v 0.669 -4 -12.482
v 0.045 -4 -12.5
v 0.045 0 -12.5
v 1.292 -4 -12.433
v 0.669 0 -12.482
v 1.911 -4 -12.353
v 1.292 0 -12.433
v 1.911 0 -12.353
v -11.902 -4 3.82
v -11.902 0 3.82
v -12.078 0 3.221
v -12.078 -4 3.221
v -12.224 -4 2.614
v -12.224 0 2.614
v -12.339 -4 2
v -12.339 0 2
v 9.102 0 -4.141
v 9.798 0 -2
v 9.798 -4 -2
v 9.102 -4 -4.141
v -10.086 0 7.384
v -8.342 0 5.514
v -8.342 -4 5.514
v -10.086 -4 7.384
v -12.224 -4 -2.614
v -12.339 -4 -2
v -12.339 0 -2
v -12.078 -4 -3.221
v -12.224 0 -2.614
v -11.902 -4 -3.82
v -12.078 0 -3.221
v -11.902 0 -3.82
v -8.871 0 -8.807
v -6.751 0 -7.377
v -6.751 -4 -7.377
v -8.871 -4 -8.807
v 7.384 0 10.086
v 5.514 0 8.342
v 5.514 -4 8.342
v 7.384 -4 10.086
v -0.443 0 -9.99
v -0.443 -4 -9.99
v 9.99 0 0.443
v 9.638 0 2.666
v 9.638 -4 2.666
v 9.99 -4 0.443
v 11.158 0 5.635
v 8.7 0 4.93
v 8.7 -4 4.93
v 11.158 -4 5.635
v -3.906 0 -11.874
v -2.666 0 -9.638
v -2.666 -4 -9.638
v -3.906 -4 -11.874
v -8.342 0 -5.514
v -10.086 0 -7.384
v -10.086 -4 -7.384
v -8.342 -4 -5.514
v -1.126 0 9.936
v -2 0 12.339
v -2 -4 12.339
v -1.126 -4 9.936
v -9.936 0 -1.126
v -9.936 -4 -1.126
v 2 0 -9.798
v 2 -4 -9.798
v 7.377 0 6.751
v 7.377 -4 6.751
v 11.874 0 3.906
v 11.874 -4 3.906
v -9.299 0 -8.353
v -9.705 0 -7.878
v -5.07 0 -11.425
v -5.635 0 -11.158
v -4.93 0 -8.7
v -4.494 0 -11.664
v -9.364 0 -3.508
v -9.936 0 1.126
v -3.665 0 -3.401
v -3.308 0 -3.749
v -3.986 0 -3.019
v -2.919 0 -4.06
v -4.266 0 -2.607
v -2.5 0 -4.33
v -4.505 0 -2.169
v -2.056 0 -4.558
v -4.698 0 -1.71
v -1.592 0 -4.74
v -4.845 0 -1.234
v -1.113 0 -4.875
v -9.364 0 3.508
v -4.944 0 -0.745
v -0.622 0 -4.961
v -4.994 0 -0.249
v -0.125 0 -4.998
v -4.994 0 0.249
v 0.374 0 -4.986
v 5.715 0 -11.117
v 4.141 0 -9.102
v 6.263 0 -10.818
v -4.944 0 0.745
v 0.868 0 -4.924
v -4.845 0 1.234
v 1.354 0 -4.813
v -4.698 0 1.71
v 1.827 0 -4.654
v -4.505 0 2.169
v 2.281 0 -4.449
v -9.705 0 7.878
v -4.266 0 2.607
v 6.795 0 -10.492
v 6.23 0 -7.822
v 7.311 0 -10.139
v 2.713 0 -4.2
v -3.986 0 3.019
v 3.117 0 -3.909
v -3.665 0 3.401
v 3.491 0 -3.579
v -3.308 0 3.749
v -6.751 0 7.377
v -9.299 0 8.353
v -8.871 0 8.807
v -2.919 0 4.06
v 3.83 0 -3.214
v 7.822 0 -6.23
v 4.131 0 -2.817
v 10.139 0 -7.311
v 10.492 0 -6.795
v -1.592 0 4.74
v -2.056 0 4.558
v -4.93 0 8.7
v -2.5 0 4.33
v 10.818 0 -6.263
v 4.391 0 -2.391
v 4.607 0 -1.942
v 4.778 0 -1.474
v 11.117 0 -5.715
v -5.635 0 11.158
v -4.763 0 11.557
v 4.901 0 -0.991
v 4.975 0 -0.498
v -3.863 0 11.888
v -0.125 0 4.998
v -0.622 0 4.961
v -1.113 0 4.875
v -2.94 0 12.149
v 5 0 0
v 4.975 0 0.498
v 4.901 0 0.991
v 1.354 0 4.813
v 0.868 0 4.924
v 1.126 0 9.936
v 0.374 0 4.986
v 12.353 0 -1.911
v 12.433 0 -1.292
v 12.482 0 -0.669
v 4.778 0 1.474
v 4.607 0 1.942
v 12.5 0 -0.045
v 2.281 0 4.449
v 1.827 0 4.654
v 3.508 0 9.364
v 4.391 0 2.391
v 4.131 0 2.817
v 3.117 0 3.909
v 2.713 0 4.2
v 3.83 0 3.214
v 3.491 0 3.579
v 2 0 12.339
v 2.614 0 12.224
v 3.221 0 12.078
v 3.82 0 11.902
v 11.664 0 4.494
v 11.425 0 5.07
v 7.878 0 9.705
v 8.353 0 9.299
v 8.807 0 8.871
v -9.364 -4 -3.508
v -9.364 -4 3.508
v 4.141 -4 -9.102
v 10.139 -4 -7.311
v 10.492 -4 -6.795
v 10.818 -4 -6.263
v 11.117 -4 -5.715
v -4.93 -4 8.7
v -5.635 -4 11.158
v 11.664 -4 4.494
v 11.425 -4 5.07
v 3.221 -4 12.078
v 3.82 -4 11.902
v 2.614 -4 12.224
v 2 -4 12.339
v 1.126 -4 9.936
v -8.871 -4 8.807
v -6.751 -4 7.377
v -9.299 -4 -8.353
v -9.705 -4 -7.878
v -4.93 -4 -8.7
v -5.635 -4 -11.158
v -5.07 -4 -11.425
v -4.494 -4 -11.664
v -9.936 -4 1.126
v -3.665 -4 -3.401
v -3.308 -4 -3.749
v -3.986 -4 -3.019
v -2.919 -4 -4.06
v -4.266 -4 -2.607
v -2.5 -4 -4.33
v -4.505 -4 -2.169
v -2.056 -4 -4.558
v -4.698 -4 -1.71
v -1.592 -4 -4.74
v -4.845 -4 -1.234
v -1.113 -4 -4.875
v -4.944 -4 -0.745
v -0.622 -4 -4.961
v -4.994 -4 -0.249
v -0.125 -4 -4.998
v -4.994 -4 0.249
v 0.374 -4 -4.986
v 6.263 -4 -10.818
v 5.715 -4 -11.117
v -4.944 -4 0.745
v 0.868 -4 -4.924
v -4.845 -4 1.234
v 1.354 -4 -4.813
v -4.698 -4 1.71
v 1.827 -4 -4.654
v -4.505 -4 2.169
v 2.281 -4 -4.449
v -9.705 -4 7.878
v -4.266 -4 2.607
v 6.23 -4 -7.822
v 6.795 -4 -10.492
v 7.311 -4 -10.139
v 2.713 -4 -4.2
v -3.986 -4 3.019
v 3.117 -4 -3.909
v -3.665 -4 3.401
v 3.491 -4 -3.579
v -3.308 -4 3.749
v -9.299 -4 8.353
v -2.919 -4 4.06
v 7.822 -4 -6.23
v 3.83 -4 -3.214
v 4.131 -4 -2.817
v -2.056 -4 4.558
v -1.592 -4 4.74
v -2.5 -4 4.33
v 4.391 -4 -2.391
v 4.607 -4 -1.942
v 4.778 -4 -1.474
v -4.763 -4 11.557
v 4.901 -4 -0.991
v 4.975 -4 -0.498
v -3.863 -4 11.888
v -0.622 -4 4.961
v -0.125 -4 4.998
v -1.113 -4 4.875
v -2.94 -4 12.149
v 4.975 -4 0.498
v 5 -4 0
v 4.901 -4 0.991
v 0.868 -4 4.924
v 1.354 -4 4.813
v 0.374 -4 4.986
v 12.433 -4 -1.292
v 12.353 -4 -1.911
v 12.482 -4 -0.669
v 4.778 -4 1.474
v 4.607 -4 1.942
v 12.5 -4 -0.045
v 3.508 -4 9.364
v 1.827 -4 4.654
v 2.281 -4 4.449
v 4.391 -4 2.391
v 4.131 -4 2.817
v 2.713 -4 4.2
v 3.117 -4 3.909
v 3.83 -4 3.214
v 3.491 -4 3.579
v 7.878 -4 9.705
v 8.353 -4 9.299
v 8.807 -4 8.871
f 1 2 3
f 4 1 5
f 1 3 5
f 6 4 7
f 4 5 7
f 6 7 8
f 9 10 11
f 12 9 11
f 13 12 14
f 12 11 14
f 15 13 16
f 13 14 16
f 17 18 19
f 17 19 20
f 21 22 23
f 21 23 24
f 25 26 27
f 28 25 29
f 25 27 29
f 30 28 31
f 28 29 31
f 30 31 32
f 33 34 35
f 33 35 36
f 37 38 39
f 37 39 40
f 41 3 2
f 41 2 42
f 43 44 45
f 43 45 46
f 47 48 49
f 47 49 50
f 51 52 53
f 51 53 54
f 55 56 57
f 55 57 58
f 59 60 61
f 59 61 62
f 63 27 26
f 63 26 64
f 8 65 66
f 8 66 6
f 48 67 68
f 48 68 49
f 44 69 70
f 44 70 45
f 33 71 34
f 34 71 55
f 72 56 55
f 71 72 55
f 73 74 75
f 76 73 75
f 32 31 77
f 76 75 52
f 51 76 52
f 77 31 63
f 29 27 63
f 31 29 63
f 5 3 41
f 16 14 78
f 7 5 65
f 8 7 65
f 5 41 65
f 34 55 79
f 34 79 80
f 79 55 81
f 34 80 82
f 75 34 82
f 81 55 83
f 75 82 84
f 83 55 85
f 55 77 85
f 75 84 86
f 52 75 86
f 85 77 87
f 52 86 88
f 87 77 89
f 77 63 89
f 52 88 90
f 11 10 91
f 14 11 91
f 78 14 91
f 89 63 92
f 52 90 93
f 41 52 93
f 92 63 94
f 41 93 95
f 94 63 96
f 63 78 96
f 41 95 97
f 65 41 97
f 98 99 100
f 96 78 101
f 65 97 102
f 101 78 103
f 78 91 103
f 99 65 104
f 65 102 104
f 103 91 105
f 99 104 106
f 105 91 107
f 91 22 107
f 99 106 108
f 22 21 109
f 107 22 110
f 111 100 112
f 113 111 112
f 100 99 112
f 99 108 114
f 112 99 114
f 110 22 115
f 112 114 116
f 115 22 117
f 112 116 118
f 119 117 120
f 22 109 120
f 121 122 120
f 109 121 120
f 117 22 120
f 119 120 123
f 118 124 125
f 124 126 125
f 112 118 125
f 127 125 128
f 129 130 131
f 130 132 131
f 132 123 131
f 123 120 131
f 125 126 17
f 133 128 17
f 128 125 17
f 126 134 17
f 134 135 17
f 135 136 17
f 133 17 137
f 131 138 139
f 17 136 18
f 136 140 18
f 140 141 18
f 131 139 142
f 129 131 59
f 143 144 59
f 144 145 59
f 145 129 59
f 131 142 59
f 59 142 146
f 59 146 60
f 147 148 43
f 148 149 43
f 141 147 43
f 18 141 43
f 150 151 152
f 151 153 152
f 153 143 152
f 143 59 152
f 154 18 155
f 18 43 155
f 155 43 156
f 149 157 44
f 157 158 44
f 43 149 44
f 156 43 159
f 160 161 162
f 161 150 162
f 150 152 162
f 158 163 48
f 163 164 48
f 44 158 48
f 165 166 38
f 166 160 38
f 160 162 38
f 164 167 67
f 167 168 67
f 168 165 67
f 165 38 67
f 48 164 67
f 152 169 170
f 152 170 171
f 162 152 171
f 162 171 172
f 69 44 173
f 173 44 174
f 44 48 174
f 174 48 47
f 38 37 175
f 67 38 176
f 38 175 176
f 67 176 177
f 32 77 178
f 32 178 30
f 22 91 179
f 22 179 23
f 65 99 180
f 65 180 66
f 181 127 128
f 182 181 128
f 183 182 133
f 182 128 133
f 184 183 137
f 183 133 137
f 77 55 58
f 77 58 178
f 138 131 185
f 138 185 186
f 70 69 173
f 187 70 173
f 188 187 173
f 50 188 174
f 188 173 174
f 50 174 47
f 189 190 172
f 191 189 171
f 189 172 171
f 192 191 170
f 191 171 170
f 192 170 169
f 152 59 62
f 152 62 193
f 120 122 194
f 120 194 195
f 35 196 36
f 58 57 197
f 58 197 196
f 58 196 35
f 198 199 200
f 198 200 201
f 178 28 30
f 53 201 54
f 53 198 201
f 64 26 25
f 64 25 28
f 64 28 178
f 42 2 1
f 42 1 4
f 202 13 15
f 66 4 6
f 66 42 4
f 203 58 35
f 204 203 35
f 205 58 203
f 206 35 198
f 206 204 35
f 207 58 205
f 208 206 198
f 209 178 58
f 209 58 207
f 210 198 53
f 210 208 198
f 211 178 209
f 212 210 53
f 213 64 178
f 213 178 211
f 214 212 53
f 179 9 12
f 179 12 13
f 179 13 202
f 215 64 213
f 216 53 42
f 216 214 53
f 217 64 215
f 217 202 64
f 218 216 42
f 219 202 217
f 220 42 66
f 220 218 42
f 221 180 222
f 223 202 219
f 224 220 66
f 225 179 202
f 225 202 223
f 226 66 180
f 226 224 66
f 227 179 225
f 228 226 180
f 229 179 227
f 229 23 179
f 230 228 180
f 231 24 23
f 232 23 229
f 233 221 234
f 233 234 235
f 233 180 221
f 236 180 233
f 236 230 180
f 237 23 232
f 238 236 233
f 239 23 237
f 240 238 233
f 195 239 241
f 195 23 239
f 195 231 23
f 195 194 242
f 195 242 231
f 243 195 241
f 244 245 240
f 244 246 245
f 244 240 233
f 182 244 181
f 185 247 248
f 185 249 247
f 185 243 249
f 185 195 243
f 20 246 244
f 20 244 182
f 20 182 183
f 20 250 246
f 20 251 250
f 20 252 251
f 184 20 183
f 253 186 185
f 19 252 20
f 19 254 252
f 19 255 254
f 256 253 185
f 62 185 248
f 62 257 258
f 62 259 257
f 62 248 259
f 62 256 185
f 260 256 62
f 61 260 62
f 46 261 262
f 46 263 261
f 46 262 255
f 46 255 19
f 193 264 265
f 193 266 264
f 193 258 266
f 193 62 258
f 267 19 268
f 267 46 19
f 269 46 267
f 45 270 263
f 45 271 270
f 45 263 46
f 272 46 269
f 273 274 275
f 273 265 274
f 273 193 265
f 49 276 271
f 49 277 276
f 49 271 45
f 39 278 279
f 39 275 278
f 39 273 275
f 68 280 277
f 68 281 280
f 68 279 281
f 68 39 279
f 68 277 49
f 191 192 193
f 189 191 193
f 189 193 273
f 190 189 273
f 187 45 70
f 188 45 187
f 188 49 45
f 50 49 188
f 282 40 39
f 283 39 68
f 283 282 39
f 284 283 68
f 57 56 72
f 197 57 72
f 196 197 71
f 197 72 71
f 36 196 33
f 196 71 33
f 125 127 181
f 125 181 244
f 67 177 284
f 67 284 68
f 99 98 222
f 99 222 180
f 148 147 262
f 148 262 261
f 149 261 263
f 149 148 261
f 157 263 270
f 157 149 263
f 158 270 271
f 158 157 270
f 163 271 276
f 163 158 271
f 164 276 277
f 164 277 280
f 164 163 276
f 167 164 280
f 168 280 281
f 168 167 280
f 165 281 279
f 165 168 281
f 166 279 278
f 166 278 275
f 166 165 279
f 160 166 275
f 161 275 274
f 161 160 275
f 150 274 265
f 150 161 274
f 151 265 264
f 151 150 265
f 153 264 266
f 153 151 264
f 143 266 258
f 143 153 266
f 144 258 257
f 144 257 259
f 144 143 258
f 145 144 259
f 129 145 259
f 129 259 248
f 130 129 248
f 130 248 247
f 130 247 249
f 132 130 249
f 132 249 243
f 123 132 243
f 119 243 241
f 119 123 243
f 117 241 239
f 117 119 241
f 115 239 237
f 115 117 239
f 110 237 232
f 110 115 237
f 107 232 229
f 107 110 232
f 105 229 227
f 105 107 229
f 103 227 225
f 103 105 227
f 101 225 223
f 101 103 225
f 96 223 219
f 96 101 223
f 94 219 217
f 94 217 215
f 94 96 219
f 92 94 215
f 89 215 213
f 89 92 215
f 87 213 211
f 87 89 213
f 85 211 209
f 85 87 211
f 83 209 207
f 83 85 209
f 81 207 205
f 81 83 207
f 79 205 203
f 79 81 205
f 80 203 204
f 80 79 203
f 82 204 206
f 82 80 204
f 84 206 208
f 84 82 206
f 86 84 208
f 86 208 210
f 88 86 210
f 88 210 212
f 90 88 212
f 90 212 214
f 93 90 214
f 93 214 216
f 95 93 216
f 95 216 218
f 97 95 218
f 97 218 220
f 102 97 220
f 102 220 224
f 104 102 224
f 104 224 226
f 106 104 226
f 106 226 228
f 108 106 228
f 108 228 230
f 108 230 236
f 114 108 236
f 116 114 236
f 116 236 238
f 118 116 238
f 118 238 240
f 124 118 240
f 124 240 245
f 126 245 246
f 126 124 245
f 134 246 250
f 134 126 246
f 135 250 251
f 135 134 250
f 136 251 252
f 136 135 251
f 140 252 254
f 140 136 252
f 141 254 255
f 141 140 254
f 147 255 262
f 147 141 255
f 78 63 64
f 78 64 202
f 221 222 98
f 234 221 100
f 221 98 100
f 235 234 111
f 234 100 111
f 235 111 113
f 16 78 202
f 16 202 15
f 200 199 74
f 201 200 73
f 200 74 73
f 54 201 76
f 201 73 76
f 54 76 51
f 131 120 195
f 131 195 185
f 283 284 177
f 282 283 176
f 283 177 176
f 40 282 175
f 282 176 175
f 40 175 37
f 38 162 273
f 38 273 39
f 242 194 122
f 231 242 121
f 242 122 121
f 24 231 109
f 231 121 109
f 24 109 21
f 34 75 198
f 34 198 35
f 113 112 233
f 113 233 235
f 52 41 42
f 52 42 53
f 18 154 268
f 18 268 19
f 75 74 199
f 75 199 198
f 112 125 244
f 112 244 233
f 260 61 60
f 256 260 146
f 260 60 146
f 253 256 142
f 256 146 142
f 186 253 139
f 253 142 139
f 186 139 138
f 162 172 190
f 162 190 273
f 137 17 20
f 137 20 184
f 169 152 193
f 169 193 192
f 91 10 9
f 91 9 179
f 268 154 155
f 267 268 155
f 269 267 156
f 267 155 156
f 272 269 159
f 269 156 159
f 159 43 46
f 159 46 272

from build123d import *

# Parameters (mm, degrees)
F3_R            = 5
F4_DEPTH        = 4
F5_DEPTH        = 8
F5_COPIES_COUNT = 13
F5_COPIES_ANGLE = 324


# Not quite as in the source:
# - a feature of the source that left no trace in its solid (it failed there, or was rolled back) is left out
# - a pattern or mirror of a feature is missing from the dataset's text; its kind, count and spacing are read off the source's solid


with BuildPart() as f4:
    # F3 (on Front) → F4 (new body)
    with BuildSketch(Plane.XZ):
        with BuildLine():
            ThreePointArc((-2, 12.3389626793), (-8.100925873, -9.5197163823), (12.5, 0))
            ThreePointArc((12.5, 0), (9.5197163823, 8.100925873), (2, 12.3389626793))
            Line((2, 12.3389626793), (1.1255583585, 9.9364540145))
            Line((1.1255583585, 9.9364540145), (-1.1255583585, 9.9364540145))
            Line((-1.1255583585, 9.9364540145), (-2, 12.3389626793))
        make_face()
        Circle(F3_R, mode=Mode.SUBTRACT)
        with BuildLine():
            Line((1.1255583585, 9.9364540145), (2, 12.3389626793))
            ThreePointArc((2, 12.3389626793), (0, 12.5), (-2, 12.3389626793))
            Line((-2, 12.3389626793), (-1.1255583585, 9.9364540145))
            Line((-1.1255583585, 9.9364540145), (1.1255583585, 9.9364540145))
        make_face()
    extrude(amount=F4_DEPTH)

    # F3 (on Front) → F5 (cut)
    with BuildSketch(Plane.XZ):
        with BuildLine():
            Line((1.1255583585, 9.9364540145), (2, 12.3389626793))
            ThreePointArc((2, 12.3389626793), (0, 12.5), (-2, 12.3389626793))
            Line((-2, 12.3389626793), (-1.1255583585, 9.9364540145))
            Line((-1.1255583585, 9.9364540145), (1.1255583585, 9.9364540145))
        make_face()
    f5 = extrude(amount=F5_DEPTH, mode=Mode.SUBTRACT)

    # F5_copies: F5 ×13 about axis
    f5_copies_axis = Axis((0, 0, 0), (0, 1, 0))
    for i in range(1, F5_COPIES_COUNT):
        add(f5.rotate(f5_copies_axis, i * F5_COPIES_ANGLE / (F5_COPIES_COUNT - 1)), mode=Mode.SUBTRACT)


solid = f4.part
